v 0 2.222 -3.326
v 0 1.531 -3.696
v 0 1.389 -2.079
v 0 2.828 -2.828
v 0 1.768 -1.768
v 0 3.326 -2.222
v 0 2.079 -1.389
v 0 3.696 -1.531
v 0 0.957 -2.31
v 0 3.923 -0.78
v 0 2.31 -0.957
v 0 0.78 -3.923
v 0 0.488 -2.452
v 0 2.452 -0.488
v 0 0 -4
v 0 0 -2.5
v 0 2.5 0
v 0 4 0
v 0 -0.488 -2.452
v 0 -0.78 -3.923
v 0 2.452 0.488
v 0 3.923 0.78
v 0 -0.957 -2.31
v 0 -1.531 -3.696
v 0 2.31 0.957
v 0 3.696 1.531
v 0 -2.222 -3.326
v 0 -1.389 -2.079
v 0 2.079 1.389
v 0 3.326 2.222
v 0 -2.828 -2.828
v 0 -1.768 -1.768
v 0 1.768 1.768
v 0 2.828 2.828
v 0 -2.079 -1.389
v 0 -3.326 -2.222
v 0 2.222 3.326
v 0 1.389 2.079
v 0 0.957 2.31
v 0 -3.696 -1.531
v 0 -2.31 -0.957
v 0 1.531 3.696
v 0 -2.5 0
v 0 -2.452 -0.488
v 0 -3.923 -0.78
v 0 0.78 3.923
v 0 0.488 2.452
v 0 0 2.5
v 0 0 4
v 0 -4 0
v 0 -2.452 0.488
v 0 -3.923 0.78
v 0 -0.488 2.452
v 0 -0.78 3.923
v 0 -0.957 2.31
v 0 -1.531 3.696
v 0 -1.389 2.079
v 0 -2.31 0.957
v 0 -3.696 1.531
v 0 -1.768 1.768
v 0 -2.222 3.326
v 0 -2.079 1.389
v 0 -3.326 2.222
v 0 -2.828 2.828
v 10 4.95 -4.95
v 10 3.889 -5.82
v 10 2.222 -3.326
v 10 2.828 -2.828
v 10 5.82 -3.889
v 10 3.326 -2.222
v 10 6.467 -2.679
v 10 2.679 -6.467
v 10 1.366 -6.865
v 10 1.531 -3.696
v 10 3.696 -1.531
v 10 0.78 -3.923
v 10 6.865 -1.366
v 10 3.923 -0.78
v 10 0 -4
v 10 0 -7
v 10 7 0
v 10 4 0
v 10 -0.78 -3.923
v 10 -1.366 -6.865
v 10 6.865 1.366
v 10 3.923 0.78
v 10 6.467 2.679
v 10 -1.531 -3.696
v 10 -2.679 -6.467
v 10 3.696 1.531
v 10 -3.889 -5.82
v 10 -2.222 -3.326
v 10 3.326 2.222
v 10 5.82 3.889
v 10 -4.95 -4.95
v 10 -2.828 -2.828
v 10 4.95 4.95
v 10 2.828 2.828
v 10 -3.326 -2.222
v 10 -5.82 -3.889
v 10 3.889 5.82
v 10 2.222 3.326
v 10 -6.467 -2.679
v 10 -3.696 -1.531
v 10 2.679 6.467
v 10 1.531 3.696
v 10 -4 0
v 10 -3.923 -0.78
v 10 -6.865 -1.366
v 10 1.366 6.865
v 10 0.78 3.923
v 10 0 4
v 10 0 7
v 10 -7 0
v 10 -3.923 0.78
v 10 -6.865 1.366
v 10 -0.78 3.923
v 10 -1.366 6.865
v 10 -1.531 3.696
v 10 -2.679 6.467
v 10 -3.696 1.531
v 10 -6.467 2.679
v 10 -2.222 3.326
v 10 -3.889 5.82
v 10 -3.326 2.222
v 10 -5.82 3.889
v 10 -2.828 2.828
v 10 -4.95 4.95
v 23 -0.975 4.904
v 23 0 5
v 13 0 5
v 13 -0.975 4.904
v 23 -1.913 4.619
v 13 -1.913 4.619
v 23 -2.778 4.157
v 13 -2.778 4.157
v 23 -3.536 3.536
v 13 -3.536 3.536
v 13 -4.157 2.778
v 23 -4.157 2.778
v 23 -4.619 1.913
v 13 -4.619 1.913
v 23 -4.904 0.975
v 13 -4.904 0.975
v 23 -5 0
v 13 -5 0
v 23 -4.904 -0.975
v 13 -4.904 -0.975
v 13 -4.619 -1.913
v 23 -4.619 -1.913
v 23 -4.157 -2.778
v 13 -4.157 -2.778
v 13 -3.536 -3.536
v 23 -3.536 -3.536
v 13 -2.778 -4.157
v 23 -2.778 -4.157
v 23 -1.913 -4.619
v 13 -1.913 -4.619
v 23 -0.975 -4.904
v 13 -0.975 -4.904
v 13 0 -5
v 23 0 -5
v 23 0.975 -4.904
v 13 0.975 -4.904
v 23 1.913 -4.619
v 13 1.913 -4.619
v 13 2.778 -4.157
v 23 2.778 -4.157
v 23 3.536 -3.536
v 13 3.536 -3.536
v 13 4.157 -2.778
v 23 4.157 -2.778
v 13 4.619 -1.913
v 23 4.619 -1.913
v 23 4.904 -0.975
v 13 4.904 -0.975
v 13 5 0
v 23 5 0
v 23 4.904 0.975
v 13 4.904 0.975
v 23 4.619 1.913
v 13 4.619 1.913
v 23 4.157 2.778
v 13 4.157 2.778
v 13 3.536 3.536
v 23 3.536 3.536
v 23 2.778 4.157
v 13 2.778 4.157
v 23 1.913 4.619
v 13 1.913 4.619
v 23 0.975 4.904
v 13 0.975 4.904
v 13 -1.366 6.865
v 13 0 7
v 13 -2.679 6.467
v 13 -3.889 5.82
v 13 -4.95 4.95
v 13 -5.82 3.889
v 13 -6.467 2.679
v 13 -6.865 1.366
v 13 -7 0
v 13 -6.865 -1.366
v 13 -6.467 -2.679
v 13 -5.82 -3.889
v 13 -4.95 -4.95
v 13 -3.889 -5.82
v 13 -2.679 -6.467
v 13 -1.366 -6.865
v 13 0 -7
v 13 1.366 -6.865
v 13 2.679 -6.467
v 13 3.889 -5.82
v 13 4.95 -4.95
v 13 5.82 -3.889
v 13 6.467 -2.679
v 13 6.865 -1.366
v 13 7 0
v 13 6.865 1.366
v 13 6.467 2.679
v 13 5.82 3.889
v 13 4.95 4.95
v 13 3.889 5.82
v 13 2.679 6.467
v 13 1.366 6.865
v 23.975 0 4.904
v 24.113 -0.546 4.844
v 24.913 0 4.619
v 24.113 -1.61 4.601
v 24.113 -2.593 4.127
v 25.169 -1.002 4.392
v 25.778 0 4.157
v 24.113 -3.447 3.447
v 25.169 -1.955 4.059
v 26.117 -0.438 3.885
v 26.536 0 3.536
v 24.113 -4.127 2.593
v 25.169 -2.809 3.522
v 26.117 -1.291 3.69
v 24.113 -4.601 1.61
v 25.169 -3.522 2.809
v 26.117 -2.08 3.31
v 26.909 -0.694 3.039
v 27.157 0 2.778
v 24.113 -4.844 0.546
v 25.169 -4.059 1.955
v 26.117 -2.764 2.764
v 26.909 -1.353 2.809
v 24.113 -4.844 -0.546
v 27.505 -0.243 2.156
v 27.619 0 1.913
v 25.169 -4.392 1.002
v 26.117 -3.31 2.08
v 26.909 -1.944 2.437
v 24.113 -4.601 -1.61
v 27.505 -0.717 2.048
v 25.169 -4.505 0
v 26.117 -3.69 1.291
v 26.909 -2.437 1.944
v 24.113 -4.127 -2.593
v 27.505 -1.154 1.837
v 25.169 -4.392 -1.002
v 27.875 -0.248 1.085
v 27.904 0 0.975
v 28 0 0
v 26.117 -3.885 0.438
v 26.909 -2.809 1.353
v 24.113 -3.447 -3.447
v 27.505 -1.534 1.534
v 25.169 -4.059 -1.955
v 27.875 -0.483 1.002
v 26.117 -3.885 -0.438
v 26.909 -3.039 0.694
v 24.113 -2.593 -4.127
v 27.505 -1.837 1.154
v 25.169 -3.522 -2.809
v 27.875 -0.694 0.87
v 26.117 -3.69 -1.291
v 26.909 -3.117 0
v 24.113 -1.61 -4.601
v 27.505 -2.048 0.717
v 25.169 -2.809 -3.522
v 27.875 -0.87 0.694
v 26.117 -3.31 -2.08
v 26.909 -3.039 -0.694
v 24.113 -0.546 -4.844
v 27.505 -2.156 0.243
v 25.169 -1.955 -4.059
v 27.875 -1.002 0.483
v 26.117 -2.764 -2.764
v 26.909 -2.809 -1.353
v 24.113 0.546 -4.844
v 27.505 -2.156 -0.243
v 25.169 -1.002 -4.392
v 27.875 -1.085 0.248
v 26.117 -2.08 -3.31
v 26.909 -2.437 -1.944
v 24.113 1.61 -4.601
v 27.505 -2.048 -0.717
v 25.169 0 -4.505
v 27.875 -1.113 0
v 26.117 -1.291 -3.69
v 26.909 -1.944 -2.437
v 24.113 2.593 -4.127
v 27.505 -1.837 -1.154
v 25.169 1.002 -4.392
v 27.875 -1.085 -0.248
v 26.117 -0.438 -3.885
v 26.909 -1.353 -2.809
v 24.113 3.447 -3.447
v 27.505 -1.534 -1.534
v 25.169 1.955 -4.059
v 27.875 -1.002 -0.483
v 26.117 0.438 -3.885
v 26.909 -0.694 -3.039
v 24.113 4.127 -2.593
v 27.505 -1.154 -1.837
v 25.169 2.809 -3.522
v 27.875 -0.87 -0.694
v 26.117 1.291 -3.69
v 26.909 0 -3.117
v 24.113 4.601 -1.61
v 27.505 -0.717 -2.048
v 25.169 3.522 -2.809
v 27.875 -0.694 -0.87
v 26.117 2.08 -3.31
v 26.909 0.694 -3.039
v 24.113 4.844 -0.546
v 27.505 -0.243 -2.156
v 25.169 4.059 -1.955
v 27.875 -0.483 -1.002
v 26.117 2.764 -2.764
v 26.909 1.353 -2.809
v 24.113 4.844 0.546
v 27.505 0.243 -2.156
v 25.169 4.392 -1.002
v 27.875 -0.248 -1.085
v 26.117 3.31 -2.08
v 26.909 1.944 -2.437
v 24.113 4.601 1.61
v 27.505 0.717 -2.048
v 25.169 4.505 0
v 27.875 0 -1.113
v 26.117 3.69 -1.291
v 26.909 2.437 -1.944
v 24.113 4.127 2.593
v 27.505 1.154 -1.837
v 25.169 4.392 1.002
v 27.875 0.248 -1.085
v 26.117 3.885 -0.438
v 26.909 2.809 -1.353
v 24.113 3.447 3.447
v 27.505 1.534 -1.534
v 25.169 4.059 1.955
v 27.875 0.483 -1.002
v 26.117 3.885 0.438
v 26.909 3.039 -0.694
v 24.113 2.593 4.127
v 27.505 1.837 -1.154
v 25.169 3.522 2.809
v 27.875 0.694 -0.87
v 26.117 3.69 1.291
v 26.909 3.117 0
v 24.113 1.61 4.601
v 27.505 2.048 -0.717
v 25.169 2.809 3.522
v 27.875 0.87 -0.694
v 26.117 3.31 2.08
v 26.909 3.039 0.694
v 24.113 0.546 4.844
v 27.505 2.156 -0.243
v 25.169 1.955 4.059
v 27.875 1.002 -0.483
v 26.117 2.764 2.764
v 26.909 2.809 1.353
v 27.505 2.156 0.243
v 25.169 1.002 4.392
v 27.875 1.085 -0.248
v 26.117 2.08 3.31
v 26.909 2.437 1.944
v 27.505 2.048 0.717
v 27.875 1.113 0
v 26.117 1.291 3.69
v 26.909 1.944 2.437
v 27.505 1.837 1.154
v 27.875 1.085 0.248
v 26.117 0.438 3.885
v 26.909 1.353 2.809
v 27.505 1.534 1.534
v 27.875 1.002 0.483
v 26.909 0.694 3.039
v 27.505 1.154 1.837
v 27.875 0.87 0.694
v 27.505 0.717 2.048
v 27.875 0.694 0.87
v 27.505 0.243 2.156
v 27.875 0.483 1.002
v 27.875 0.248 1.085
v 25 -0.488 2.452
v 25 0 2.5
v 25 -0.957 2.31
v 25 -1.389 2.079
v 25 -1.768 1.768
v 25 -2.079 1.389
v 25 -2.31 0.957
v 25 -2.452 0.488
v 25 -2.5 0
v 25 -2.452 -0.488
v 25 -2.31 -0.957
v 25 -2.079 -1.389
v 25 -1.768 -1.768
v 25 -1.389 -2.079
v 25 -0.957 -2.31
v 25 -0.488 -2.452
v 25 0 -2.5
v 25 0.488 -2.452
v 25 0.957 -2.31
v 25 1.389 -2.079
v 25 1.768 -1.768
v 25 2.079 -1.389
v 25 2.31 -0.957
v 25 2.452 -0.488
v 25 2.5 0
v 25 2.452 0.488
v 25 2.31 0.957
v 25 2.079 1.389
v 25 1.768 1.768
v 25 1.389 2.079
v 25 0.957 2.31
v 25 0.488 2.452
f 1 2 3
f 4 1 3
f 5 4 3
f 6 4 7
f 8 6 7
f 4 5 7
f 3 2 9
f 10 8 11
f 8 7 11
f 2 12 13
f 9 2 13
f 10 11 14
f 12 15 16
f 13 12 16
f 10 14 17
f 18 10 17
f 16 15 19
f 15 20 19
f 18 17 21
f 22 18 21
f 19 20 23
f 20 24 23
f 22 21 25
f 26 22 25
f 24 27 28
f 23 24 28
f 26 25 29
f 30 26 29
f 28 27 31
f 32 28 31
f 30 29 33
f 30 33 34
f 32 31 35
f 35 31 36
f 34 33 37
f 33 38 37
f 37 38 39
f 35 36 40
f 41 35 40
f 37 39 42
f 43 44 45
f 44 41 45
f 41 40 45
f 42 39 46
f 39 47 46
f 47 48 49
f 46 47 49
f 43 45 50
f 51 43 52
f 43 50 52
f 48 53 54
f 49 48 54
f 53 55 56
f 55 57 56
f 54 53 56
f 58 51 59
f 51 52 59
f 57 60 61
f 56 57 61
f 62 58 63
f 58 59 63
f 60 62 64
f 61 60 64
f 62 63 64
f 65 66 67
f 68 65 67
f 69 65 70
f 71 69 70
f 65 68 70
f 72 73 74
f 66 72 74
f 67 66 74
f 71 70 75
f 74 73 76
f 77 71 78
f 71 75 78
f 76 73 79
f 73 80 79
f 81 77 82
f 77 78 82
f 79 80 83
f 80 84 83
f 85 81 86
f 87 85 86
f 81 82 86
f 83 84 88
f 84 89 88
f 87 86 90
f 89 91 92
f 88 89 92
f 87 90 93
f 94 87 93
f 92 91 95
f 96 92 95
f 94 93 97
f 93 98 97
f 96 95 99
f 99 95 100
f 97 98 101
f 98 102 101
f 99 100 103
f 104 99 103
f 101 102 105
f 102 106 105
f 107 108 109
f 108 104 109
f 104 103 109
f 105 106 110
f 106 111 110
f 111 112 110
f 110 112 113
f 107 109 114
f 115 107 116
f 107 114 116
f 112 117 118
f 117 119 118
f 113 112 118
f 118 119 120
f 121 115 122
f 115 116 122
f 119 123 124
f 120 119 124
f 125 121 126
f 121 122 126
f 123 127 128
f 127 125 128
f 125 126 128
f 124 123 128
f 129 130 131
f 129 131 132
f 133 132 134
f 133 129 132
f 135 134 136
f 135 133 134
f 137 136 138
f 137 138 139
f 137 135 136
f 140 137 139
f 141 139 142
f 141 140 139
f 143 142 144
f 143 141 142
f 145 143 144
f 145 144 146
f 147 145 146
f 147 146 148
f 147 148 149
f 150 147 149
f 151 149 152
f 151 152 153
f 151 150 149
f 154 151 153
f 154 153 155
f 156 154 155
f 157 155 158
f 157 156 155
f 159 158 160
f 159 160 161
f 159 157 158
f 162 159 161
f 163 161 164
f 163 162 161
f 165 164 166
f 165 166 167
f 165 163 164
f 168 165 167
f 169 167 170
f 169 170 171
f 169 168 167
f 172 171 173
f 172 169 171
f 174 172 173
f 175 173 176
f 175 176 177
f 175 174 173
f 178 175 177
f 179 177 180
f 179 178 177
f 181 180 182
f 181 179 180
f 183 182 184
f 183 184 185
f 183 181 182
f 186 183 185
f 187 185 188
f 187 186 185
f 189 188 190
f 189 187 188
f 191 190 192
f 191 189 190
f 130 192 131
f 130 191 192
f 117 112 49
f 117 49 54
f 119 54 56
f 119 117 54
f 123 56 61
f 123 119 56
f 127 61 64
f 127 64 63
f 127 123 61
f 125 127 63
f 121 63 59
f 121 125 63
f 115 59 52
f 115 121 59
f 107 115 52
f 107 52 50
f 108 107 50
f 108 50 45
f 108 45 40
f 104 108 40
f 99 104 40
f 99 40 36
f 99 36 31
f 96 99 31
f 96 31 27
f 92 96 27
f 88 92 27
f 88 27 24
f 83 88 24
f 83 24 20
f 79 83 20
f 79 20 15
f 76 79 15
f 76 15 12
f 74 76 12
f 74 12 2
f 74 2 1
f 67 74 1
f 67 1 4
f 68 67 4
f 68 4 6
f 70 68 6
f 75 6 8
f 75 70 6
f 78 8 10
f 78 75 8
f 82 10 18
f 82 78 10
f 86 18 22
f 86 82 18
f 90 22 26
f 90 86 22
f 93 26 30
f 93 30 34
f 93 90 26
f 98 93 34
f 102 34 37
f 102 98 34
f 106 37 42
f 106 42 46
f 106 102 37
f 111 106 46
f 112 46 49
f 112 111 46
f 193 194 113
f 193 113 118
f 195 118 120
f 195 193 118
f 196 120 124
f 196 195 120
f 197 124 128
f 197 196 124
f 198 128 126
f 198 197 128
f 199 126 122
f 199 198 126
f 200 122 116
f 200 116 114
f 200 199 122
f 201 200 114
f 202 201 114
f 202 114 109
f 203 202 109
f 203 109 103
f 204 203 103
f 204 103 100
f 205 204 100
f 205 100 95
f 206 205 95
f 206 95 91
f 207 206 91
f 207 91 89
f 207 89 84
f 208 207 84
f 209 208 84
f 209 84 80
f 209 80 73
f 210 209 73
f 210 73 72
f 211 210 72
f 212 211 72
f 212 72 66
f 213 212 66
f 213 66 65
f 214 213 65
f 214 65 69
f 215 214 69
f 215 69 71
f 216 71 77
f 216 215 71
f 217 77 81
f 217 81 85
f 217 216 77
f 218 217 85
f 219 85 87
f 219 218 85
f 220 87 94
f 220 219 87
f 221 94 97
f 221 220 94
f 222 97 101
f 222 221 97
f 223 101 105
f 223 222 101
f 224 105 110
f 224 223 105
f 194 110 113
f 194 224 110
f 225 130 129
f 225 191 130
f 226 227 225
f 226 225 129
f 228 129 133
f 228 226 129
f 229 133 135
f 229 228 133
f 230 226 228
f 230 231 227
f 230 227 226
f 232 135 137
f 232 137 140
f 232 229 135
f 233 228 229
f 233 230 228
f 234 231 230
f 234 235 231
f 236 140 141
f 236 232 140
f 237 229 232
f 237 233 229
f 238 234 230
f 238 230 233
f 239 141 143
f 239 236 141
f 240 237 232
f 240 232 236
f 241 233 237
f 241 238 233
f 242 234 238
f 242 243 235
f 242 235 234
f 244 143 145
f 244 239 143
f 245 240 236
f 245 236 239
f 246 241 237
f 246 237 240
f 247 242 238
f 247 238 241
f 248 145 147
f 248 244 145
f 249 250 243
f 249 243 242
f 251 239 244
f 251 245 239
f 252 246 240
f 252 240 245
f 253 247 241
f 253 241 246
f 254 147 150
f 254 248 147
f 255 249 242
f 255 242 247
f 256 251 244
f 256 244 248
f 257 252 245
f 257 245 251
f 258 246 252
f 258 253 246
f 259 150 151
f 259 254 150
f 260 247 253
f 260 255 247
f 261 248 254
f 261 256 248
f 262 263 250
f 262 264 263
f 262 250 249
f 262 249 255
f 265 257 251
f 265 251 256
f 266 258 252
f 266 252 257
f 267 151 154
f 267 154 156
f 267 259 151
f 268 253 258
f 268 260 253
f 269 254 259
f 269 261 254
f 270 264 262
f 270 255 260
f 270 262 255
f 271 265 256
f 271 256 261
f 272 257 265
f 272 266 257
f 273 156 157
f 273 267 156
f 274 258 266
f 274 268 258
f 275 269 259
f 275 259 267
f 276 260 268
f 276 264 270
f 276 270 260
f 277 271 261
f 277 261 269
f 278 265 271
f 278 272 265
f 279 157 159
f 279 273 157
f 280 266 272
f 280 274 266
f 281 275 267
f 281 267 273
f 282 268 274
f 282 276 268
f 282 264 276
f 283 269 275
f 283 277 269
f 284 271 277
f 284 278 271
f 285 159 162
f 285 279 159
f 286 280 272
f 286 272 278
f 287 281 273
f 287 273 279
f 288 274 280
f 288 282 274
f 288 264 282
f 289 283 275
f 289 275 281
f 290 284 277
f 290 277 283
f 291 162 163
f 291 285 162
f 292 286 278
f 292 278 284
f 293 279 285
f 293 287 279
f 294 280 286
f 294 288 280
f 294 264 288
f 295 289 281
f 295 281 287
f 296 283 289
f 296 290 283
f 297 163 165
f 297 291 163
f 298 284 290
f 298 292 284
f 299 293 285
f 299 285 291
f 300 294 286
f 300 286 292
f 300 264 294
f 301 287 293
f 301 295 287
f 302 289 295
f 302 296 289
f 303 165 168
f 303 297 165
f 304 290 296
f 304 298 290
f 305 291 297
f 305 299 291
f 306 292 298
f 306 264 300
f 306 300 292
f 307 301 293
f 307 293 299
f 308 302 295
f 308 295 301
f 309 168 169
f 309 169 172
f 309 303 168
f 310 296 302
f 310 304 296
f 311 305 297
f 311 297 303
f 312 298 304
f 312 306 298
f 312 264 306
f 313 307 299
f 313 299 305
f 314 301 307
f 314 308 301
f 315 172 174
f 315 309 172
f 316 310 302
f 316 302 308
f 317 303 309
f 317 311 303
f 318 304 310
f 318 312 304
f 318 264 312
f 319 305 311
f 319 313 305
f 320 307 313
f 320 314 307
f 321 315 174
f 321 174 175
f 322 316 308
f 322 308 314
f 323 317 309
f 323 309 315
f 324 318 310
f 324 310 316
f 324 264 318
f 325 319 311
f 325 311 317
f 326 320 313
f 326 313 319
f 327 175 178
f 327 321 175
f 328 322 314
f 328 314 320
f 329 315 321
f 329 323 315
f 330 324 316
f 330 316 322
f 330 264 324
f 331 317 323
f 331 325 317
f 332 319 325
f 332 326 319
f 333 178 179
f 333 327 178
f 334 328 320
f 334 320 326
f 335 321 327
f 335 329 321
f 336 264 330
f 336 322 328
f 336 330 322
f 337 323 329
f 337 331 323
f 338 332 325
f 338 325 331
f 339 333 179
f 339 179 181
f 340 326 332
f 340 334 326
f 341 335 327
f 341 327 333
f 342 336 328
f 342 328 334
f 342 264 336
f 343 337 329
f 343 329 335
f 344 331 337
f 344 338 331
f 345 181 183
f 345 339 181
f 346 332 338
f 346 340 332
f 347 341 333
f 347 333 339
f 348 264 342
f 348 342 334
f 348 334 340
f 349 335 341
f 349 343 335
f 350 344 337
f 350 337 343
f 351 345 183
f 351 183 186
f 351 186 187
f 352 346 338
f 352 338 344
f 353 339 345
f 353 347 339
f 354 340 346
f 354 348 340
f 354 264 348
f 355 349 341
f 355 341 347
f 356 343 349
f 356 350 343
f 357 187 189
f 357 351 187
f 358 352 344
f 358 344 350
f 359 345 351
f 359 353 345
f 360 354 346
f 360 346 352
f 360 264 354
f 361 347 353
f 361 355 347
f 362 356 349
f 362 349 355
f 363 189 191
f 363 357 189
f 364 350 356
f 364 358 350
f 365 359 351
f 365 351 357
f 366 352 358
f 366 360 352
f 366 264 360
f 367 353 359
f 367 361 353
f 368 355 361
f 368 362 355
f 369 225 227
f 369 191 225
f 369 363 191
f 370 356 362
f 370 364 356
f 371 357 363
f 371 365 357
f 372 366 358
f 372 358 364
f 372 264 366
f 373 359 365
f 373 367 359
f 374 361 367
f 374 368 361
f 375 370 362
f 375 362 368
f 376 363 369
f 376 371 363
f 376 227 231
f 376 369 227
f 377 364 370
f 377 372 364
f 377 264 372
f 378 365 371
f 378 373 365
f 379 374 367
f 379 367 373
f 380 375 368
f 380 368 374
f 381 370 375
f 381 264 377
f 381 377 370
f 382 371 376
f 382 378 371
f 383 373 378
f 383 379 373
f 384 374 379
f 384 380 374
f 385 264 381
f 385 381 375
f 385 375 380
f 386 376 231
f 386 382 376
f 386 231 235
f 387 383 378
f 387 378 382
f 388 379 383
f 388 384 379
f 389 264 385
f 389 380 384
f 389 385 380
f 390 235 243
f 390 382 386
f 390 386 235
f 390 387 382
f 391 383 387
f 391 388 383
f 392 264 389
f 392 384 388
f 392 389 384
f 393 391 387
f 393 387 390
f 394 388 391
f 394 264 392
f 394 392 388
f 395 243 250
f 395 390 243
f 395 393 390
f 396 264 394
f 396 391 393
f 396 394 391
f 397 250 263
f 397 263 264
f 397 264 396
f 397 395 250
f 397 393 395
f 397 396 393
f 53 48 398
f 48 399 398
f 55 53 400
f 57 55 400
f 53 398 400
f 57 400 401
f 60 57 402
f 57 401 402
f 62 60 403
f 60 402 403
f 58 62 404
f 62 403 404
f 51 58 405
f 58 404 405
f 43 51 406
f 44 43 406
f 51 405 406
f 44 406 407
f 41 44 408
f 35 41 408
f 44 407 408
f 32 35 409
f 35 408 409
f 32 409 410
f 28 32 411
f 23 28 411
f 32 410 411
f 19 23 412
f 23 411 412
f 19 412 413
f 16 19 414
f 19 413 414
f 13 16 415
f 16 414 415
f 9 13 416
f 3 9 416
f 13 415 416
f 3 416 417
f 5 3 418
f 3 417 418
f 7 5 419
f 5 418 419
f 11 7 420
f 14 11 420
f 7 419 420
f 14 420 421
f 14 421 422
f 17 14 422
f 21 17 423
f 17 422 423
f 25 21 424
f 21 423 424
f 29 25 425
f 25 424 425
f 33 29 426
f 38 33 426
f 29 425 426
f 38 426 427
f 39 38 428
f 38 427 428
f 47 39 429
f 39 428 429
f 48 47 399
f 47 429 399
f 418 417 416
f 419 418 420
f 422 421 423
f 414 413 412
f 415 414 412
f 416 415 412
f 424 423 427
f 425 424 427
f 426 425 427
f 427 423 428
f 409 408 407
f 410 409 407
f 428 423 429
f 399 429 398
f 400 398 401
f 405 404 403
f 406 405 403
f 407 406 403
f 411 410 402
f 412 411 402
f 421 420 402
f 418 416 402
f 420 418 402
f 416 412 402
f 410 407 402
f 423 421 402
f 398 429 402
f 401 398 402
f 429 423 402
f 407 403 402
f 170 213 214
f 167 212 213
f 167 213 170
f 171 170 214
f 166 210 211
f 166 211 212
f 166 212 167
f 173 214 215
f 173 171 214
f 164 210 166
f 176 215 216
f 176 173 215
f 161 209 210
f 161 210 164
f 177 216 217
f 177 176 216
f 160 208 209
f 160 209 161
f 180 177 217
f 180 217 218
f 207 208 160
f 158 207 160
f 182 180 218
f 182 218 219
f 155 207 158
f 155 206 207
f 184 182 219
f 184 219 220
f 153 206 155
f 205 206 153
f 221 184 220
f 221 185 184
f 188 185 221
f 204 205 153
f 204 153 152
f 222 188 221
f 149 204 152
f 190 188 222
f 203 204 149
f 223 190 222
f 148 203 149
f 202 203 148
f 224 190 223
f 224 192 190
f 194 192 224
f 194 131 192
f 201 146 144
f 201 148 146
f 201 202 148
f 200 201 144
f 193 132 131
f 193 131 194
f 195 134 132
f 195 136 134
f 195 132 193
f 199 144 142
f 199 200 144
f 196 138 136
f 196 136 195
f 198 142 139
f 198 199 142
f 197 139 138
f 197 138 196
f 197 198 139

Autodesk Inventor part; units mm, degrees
ref_plane "YZ Plane" through (0, 0, 0) normal (1, 0, 0) x (0, 1, 0)
ref_plane "XZ Plane" through (0, 0, 0) normal (0, 1, 0) x (-1, 0, 0)
ref_plane "XY Plane" through (0, 0, 0) normal (0, 0, 1) x (1, 0, 0)
sketch "Skizze1" plane through (0, 0, 0) normal (0, 1, 0) x (-1, 0, 0)
  line L0 (0, 0) -> (0, 4)
  line L1 (0, 4) -> (-10, 4)
  line L2 (-10, 4) -> (-10, 7)
  line L3 (-10, 7) -> (-13, 7)
  line L4 (-13, 7) -> (-13, 5)
  line L5 (-13, 5) -> (-23, 5)
  arc A0 (-23, 5) -> (-28, 0) centre (-23, 0) ccw
  line L6 (0, 0) -> (-28, 0)
  dimension "d0" = 3
  dimension "d1" = 10
  dimension "d2" = 15
  dimension "d3" = 14
  dimension "d4" = 8
  dimension "d5" = 10
revolve "Umdrehung1" add sketch "Skizze1" angle 360 about axis through (0, 0, 0) along (1, 0, 0)
thread "Gewinde1" size "M8x1.25" class "6g" standard "ISO Metric profile" length 10
sketch "Skizze2" plane through (0, 0, 0) normal (-1, 0, 0) x (0, 0, 1)
  circle A0 centre (0, 0) radius 4 projected
  point P0 (0, 0)
hole "Bohrung1" at (0, 0, 0) direction (1, 0, 0) diameter 5 depth 25
properties part number "1156"
